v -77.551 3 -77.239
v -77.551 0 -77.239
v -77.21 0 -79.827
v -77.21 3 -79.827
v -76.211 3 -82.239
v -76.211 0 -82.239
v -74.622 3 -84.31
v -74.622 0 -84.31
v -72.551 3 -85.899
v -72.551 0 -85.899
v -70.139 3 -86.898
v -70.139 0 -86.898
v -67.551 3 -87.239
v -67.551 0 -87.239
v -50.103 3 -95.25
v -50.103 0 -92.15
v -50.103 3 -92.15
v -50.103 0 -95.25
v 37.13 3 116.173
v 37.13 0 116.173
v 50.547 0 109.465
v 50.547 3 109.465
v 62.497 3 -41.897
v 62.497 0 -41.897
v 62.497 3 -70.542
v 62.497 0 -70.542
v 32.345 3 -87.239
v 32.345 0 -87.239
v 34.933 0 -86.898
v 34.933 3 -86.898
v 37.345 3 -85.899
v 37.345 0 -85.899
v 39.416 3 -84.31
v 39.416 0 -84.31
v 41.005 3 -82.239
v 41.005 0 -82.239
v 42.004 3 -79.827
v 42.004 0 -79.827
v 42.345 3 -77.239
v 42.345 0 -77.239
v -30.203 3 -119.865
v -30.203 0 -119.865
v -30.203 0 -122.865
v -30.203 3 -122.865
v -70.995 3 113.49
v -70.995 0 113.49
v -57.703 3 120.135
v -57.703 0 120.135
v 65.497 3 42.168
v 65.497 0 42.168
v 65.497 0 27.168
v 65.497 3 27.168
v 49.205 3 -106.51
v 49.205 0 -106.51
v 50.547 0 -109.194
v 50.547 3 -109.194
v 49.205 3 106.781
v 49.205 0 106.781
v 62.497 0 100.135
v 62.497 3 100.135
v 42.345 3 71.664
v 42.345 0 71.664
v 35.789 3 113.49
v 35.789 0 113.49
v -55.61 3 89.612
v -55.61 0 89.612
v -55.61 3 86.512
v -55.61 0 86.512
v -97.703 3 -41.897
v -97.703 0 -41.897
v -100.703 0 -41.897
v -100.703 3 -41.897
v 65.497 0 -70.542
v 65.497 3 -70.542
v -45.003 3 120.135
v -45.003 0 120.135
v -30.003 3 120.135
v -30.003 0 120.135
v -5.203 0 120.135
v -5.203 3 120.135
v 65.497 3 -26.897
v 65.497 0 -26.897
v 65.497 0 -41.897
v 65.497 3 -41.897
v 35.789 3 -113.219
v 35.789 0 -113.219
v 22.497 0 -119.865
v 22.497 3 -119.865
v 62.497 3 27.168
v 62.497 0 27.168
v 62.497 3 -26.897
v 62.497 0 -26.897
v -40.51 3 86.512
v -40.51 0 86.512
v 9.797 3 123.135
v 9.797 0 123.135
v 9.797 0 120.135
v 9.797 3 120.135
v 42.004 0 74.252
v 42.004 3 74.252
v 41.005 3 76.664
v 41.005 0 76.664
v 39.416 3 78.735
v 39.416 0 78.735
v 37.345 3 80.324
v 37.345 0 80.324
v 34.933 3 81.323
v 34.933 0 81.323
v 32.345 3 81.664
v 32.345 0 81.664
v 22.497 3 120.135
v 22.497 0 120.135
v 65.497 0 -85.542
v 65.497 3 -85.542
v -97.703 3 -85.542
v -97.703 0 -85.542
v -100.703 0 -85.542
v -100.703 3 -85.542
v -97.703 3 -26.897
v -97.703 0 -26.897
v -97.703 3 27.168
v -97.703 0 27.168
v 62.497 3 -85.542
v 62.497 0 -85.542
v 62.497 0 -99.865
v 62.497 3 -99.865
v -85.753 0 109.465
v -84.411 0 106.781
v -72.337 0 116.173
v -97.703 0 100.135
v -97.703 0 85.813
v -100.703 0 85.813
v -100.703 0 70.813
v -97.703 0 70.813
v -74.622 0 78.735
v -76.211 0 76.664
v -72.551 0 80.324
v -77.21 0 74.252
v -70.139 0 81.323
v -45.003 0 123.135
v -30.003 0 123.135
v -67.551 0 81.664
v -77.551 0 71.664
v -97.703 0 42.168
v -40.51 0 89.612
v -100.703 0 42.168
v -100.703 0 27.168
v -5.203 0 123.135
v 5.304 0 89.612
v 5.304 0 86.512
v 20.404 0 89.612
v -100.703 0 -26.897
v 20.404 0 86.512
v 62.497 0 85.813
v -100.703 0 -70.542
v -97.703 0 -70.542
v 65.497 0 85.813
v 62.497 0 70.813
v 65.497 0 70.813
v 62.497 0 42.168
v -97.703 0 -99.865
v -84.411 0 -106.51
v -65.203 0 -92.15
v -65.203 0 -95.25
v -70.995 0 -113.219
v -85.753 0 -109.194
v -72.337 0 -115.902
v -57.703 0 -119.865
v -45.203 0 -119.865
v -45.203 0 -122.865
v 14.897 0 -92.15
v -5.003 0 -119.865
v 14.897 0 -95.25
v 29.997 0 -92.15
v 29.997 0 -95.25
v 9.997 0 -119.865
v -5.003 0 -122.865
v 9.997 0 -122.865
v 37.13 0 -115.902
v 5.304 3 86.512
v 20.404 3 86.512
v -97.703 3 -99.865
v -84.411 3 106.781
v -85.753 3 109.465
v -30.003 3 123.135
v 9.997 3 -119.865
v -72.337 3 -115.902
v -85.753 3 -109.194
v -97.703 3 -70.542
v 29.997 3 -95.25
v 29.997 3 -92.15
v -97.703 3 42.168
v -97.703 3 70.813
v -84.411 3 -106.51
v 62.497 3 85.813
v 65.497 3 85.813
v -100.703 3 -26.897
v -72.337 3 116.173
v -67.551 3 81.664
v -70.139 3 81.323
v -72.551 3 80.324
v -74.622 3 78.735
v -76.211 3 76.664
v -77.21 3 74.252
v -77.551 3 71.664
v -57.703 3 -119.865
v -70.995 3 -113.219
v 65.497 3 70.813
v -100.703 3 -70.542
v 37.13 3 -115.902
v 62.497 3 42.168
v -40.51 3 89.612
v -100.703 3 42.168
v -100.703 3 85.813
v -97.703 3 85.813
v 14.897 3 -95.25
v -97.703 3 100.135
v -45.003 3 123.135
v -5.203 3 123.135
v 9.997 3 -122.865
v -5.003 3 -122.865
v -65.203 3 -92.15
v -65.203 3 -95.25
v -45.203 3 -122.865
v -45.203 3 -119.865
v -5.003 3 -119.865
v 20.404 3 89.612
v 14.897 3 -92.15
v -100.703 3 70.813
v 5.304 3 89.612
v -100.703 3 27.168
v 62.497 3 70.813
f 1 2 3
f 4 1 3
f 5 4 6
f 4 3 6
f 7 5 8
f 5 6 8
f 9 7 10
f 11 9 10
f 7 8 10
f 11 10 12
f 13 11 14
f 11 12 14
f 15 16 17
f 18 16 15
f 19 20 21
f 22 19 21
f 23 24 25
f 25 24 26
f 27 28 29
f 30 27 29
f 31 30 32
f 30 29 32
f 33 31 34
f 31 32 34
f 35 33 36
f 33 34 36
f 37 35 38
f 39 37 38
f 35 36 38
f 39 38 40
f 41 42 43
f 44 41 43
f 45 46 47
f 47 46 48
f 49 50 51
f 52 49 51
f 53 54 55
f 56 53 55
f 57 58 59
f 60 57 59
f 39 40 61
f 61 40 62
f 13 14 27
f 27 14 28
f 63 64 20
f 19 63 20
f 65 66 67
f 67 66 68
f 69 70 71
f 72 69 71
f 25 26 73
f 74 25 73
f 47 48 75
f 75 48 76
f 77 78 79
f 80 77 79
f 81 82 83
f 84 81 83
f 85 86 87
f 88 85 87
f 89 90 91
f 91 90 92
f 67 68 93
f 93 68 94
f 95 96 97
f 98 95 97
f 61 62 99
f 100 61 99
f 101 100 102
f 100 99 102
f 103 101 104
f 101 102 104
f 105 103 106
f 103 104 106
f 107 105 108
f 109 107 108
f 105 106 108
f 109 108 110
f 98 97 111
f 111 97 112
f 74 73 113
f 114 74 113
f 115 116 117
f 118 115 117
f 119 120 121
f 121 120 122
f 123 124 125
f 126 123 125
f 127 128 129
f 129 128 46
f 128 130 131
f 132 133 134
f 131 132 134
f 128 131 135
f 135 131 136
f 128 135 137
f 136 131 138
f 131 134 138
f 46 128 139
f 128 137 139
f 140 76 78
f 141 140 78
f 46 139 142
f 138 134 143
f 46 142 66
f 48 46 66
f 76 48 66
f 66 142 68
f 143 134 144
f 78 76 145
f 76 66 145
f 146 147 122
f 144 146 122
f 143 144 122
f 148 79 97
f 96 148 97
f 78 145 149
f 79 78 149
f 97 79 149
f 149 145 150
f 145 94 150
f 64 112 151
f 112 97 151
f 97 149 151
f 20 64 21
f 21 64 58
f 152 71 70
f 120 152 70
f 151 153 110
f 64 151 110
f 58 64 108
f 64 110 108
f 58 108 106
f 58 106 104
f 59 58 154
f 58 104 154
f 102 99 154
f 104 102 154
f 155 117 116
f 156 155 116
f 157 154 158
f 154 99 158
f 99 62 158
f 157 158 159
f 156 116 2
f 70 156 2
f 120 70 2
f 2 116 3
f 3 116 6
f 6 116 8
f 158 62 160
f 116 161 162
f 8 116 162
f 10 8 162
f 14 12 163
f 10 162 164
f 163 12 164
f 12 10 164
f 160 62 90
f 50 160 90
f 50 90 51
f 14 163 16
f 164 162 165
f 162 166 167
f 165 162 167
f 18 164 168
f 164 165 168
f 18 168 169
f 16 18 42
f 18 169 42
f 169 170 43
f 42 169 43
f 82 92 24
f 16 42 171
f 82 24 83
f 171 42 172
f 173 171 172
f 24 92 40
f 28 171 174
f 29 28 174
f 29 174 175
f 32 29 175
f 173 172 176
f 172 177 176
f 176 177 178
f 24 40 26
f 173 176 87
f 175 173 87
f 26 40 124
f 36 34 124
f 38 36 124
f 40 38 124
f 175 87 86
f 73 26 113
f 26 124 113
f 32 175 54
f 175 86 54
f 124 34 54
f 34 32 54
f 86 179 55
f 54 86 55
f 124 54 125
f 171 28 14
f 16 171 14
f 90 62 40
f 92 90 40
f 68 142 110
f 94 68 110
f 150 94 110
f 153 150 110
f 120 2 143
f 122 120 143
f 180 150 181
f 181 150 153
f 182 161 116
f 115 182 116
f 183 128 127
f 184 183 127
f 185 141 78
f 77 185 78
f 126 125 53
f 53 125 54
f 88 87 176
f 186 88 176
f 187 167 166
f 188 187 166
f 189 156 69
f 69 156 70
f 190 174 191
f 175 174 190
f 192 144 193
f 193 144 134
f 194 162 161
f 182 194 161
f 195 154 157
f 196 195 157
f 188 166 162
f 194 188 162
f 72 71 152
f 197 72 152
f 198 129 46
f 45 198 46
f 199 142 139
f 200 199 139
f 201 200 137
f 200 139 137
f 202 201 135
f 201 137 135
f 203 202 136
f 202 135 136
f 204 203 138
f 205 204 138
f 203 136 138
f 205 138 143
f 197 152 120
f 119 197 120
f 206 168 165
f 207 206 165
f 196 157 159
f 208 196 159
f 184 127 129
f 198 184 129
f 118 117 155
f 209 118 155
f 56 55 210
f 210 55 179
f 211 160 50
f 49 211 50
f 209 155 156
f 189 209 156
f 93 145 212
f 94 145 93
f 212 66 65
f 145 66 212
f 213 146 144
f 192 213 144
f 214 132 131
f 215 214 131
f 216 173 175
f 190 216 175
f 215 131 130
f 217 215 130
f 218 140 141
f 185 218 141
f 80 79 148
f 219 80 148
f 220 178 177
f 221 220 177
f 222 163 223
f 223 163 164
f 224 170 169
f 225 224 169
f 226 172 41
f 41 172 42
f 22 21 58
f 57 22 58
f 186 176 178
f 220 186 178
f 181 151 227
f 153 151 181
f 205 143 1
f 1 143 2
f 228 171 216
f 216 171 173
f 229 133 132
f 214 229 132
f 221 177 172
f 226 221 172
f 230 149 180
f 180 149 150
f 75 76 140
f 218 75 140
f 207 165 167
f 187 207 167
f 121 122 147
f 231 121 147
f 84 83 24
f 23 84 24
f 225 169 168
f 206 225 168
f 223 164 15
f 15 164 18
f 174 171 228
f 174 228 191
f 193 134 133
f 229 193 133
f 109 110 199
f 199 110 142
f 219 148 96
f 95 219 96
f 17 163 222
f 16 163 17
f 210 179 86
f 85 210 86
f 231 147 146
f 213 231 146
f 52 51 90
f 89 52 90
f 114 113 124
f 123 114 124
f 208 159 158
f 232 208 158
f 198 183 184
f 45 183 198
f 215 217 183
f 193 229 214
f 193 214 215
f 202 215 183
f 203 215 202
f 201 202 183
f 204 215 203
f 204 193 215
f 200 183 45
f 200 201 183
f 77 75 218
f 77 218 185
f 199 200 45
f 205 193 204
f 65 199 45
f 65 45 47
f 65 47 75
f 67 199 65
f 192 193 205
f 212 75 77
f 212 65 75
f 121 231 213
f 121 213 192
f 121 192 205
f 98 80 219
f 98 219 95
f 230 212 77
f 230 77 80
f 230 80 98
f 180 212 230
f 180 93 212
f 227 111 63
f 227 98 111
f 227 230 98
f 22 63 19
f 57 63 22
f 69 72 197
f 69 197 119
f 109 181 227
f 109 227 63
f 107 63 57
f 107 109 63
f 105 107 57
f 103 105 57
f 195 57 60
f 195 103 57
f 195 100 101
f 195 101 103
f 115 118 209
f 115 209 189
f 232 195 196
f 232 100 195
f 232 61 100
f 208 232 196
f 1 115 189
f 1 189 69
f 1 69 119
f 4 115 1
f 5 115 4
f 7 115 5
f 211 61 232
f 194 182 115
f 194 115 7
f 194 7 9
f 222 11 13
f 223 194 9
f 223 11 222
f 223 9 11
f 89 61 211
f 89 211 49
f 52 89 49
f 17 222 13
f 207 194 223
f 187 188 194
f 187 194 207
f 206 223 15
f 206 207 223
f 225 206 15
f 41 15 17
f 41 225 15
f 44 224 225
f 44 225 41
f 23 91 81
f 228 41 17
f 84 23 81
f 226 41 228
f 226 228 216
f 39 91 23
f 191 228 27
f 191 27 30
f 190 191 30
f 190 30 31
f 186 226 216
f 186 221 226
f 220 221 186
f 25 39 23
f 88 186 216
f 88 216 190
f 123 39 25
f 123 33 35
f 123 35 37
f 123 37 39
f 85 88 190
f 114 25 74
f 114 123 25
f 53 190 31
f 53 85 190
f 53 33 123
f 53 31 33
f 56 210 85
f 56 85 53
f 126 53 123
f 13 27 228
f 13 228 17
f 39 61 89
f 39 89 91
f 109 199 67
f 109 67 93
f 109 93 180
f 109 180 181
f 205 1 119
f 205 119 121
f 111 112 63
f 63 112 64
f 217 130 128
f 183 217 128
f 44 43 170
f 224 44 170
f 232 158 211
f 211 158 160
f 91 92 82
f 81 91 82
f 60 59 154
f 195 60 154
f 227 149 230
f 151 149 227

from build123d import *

# Parameters (mm, degrees)
SKETCH1_W           = 15.1
SKETCH1_H           = 3.1
BOSS_EXTRUDE1_DEPTH = 3


with BuildPart() as part:
    # Sketch1 → Boss-Extrude1 (new body)
    with BuildSketch(Plane(origin=(0, 0, 0), x_dir=(1, 0, 0), z_dir=(0, 1, 0))):
        Polygon((22.496777959, -120.1354094), (35.788574027, -113.489511367), (37.130214813, -116.17279294), (50.546622678, -109.464589007), (49.204981892, -106.781307434), (62.496777959, -100.1354094), (62.496777959, -85.8129094), (65.496777959, -85.8129094), (65.496777959, -70.8129094), (62.496777959, -70.8129094), (62.496777959, -42.1679094), (65.496777959, -42.1679094), (65.496777959, -27.1679094), (62.496777959, -27.1679094), (62.496777959, 2.411735491), (62.496777959, 26.8970906), (65.496777959, 26.8970906), (65.496777959, 41.8970906), (62.496777959, 41.8970906), (62.496777959, 70.5420906), (65.496777959, 70.5420906), (65.496777959, 85.5420906), (62.496777959, 85.5420906), (62.496777959, 99.8645906), (49.204981892, 106.510488633), (50.546622678, 109.193770206), (37.130214813, 115.901974139), (35.788574027, 113.218692566), (22.496777959, 119.8645906), (9.996777959, 119.8645906), (9.996777959, 122.8645906), (-5.003222041, 122.8645906), (-5.003222041, 119.8645906), (-30.203222041, 119.8645906), (-30.203222041, 122.8645906), (-45.203222041, 122.8645906), (-45.203222041, 119.8645906), (-57.703222041, 119.8645906), (-70.995018108, 113.218692566), (-72.336658895, 115.901974139), (-85.75306676, 109.193770206), (-84.411425973, 106.510488633), (-97.703222041, 99.8645906), (-97.703222041, 85.5420906), (-100.703222041, 85.5420906), (-100.703222041, 70.5420906), (-97.703222041, 70.5420906), (-97.703222041, 41.8970906), (-100.703222041, 41.8970906), (-100.703222041, 26.8970906), (-97.703222041, 26.8970906), (-97.703222041, 2.411735491), (-97.703222041, -27.1679094), (-100.703222041, -27.1679094), (-100.703222041, -42.1679094), (-97.703222041, -42.1679094), (-97.703222041, -70.8129094), (-100.703222041, -70.8129094), (-100.703222041, -85.8129094), (-97.703222041, -85.8129094), (-97.703222041, -100.1354094), (-84.411425973, -106.781307434), (-85.75306676, -109.464589007), (-72.336658895, -116.17279294), (-70.995018108, -113.489511367), (-57.703222041, -120.1354094), (-45.003222041, -120.1354094), (-45.003222041, -123.1354094), (-30.003222041, -123.1354094), (-30.003222041, -120.1354094), (-5.203222041, -120.1354094), (-5.203222041, -123.1354094), (9.796777959, -123.1354094), (9.796777959, -120.1354094), align=None)
        with Locations((-57.653222041, 93.700471208)):
            Rectangle(SKETCH1_W, SKETCH1_H, mode=Mode.SUBTRACT)
        with Locations((-48.060490447, -88.062310774)):
            Rectangle(SKETCH1_W, SKETCH1_H, mode=Mode.SUBTRACT)
        with Locations((22.446777959, 93.700471208)):
            Rectangle(SKETCH1_W, SKETCH1_H, mode=Mode.SUBTRACT)
        with Locations((12.854046365, -88.062310774)):
            Rectangle(SKETCH1_W, SKETCH1_H, mode=Mode.SUBTRACT)
        with BuildLine():
            Line((-67.551147117, 87.238656666), (32.344703035, 87.238656666))
            ThreePointArc((32.344703035, 87.238656666), (39.415770847, 84.309724478), (42.344703035, 77.238656666))
            Line((42.344703035, 77.238656666), (42.344703035, -71.663891856))
            ThreePointArc((42.344703035, -71.663891856), (39.415770847, -78.734959668), (32.344703035, -81.663891856))
            Line((32.344703035, -81.663891856), (-67.551147117, -81.663891856))
            ThreePointArc((-67.551147117, -81.663891856), (-74.622214928, -78.734959668), (-77.551147117, -71.663891856))
            Line((-77.551147117, -71.663891856), (-77.551147117, 77.238656666))
            ThreePointArc((-77.551147117, 77.238656666), (-74.622214928, 84.309724478), (-67.551147117, 87.238656666))
        make_face(mode=Mode.SUBTRACT)
    extrude(amount=BOSS_EXTRUDE1_DEPTH)


solid = part.part
